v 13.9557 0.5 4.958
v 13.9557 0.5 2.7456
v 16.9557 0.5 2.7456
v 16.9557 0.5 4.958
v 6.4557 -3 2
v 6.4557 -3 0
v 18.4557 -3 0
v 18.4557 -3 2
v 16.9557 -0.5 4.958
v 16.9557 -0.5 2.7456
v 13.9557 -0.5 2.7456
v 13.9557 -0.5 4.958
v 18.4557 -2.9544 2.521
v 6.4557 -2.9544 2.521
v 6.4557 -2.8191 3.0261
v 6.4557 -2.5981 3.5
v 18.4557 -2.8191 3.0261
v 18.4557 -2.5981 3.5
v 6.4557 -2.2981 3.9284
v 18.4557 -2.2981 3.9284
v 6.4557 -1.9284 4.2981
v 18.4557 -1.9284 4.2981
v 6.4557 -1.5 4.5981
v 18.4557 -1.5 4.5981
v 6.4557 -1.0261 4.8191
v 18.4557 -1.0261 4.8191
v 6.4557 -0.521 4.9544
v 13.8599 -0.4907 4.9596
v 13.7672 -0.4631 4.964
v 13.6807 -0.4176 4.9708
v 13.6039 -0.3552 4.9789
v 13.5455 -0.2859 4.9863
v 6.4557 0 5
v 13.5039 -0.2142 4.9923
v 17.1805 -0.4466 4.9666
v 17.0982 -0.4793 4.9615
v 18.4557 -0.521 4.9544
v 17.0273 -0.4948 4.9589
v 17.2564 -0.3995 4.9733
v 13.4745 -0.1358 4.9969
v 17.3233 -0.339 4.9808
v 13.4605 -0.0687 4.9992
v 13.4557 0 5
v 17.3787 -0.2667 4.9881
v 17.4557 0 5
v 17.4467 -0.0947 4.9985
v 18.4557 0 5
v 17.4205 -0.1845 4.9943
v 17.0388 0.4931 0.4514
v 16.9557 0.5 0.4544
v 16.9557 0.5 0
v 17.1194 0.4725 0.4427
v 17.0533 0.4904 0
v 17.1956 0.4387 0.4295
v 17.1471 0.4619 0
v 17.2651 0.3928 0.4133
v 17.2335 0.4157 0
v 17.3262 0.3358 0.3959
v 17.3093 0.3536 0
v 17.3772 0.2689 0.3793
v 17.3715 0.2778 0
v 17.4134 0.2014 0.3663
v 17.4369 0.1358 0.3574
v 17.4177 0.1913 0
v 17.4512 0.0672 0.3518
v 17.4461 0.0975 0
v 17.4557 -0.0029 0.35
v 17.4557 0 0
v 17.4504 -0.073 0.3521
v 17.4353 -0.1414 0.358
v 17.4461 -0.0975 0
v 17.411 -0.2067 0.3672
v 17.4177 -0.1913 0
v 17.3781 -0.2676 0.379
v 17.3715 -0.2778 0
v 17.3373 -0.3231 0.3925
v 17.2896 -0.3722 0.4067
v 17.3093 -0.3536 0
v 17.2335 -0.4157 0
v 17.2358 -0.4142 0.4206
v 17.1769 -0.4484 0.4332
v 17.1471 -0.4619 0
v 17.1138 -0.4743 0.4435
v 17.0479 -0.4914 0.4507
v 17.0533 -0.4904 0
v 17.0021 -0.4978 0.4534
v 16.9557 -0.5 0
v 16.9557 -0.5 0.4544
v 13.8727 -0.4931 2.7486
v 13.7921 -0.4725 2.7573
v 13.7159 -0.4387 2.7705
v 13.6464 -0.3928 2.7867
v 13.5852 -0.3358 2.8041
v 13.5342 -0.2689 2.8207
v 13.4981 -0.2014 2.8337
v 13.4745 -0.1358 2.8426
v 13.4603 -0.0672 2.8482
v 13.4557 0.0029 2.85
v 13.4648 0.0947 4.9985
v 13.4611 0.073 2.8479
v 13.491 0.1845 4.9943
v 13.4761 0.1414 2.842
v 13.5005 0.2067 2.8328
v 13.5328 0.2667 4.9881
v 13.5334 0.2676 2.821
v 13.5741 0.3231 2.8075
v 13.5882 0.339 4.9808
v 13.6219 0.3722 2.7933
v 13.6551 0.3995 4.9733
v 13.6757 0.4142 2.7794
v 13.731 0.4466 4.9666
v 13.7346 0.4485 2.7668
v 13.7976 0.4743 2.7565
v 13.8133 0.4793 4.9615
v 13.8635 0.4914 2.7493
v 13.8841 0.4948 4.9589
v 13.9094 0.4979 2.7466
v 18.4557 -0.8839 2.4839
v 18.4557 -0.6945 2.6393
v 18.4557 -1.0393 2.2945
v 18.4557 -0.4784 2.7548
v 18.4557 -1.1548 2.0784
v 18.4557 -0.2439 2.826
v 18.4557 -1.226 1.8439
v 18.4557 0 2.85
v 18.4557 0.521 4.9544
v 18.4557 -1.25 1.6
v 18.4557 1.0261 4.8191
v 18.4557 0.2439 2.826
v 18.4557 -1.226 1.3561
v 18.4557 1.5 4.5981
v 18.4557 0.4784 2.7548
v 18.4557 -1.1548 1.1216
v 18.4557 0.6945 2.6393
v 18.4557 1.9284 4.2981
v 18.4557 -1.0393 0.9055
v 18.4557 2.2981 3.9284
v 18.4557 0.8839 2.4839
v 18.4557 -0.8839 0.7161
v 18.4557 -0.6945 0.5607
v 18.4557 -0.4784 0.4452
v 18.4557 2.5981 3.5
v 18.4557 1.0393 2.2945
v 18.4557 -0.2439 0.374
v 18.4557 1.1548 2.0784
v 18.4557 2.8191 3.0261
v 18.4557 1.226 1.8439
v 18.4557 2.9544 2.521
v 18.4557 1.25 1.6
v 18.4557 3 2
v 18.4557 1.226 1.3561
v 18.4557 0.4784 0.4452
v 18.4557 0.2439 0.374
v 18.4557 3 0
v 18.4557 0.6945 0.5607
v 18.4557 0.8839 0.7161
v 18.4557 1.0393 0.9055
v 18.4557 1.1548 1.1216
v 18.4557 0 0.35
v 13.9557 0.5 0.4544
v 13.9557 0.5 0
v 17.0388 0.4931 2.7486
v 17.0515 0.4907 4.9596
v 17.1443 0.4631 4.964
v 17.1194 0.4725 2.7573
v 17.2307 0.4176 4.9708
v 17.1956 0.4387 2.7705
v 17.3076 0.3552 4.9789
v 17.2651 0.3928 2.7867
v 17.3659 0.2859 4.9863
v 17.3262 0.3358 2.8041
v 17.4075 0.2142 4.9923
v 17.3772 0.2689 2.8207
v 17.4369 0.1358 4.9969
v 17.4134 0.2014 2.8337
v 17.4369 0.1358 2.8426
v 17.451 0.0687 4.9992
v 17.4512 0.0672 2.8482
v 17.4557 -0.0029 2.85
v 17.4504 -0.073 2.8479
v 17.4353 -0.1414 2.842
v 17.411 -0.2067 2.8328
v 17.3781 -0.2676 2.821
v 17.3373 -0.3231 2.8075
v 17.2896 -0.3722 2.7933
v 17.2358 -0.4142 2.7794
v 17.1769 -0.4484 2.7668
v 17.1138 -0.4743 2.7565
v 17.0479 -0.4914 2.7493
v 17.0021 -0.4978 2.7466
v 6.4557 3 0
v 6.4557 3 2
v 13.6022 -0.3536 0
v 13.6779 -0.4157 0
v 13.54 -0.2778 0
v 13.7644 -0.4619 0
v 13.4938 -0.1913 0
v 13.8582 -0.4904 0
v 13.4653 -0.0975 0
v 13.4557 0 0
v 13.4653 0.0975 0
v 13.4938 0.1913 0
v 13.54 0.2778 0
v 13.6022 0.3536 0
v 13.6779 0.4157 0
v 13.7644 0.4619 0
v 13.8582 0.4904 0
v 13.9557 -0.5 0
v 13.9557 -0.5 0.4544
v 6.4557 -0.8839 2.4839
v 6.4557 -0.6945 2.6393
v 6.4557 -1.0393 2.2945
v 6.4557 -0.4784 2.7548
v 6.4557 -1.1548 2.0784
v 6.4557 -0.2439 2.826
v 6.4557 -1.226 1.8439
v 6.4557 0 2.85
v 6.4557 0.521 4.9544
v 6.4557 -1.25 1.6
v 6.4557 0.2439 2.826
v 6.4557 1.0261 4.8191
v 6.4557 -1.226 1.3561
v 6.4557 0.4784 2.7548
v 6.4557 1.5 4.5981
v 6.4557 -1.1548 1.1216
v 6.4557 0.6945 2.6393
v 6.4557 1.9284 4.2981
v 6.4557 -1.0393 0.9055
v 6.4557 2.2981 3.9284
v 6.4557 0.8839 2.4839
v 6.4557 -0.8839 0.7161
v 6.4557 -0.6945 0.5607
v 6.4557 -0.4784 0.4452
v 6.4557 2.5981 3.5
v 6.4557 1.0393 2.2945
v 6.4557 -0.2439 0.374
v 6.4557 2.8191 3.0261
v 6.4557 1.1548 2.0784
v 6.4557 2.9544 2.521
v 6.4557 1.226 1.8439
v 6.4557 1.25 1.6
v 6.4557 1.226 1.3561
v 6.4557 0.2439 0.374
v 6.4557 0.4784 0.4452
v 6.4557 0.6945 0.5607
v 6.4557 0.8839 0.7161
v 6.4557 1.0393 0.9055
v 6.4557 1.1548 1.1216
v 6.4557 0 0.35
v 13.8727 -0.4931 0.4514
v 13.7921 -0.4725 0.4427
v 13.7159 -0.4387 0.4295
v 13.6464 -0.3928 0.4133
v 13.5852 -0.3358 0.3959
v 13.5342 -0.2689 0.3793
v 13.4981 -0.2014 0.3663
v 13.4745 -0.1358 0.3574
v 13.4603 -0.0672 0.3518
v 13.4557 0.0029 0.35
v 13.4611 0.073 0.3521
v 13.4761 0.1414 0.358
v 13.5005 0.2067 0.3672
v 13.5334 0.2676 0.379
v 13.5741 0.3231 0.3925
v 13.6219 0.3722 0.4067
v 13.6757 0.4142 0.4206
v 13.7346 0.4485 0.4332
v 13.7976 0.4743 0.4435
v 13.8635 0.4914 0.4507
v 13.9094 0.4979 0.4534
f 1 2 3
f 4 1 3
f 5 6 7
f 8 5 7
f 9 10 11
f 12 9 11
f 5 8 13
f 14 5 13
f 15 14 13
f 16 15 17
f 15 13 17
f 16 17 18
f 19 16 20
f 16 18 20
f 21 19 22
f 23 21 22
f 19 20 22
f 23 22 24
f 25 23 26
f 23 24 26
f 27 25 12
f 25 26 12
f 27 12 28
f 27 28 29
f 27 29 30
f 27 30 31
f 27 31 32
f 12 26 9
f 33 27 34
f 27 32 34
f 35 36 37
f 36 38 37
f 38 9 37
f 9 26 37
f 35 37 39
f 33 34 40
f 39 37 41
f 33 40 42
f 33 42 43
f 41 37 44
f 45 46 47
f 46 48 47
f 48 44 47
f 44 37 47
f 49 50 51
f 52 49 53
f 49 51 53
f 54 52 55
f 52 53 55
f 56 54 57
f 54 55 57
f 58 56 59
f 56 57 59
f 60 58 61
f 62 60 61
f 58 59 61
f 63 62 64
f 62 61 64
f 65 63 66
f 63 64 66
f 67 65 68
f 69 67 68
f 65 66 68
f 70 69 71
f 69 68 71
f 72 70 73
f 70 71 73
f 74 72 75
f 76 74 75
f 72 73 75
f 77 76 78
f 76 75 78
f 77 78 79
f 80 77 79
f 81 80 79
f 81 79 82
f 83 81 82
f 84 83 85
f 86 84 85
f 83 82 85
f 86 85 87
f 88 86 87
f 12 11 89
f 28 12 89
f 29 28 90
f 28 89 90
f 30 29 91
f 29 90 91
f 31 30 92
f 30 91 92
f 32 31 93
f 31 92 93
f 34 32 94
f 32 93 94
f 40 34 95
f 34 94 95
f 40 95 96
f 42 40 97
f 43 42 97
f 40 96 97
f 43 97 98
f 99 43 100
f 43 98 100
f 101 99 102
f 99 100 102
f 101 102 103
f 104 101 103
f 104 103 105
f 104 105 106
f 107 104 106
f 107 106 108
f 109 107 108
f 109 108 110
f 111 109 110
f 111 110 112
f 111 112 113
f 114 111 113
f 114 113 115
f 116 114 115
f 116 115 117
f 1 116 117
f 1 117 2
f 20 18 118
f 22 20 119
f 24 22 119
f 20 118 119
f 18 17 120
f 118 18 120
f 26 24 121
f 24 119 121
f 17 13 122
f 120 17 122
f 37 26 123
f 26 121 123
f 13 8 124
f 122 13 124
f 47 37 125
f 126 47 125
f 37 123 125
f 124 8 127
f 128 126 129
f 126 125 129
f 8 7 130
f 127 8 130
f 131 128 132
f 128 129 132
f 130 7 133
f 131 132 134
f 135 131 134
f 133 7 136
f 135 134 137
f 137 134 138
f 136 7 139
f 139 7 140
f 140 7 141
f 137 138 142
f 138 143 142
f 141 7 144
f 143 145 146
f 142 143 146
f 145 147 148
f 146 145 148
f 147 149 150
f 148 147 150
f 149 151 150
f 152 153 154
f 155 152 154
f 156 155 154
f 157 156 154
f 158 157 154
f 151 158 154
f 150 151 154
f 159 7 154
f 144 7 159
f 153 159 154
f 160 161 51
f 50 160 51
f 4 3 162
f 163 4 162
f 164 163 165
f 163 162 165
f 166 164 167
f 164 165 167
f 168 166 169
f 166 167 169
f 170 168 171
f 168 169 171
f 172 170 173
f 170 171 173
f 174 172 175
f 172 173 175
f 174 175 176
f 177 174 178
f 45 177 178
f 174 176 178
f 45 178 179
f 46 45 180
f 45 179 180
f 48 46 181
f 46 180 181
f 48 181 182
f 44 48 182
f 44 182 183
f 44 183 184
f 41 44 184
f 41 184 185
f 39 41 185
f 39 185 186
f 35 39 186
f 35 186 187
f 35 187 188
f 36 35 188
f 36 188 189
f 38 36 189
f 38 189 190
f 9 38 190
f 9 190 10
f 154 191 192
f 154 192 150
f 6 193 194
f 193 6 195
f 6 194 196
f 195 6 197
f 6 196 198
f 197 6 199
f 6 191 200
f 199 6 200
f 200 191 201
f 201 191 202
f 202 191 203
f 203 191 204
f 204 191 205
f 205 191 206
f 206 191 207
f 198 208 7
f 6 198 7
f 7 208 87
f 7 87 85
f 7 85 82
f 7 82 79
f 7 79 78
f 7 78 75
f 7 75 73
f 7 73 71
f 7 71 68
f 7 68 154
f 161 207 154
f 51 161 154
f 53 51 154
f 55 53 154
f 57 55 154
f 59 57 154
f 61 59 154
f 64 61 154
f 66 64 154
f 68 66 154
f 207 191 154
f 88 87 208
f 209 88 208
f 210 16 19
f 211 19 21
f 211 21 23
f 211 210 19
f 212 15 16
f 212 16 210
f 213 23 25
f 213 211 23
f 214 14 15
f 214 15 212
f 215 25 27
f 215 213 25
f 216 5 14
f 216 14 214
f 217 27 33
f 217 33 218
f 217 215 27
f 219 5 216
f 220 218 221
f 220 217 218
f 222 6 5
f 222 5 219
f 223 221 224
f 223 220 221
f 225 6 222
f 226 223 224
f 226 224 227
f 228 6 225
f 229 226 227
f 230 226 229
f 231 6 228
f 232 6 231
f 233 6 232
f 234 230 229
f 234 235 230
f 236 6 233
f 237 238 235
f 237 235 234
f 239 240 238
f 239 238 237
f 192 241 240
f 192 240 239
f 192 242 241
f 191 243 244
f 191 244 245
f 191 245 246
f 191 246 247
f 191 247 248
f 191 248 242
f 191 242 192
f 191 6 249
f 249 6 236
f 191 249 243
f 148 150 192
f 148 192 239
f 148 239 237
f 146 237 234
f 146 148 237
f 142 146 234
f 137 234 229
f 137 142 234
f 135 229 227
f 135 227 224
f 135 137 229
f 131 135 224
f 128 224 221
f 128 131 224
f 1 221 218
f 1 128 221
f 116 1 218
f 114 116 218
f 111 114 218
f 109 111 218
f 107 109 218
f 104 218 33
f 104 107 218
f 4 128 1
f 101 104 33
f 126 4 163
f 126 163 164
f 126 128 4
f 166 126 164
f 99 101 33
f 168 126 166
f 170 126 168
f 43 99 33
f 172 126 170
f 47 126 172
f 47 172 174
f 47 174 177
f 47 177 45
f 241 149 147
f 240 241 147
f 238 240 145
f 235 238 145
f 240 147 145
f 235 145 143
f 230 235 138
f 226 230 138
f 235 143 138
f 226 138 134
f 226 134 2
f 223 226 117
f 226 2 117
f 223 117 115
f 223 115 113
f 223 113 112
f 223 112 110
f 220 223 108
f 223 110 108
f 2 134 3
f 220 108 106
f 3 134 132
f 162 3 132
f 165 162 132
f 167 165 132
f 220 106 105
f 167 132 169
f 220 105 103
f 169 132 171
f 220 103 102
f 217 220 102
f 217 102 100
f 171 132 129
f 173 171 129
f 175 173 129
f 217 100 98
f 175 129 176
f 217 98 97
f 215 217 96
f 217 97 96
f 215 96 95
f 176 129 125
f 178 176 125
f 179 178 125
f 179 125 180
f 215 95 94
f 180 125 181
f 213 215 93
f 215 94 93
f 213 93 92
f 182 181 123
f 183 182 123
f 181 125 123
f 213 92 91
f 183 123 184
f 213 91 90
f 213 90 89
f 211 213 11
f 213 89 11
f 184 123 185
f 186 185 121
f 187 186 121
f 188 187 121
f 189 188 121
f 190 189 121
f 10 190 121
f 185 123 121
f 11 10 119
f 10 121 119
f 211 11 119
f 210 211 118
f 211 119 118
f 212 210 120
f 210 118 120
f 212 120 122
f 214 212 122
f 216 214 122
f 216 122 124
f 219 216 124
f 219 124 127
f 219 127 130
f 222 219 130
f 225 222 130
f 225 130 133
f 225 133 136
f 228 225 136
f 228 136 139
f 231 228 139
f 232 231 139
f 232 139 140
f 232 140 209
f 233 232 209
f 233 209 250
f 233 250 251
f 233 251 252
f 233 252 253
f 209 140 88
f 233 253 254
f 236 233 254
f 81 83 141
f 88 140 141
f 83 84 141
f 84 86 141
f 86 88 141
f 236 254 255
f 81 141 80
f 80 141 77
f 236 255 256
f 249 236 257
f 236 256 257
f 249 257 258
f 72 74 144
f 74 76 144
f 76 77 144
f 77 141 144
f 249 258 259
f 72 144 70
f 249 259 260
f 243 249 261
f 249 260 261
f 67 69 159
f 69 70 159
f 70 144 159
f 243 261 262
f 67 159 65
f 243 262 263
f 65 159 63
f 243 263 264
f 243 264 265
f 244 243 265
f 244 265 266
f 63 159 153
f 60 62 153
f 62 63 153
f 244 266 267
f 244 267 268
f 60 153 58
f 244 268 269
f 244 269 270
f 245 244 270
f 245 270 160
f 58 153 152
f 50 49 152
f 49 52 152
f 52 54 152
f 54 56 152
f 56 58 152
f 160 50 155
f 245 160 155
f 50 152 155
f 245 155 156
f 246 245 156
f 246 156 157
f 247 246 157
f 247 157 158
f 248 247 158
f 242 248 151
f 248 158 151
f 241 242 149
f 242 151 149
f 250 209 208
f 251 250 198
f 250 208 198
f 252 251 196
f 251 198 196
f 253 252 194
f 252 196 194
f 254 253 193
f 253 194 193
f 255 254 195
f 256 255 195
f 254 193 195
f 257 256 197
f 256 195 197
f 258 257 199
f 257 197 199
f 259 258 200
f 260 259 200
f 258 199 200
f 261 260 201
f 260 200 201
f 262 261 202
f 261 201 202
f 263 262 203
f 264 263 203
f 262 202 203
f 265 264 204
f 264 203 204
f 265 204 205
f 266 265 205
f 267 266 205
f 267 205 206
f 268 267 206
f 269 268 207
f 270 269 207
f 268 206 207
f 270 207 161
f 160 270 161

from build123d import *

# Parameters (mm, degrees)
F0_W     = 12
F0_H     = 6
F1_DEPTH = 5
F2_R     = 2.99999
F3_R     = 1.25
F4_DEPTH = 25
F6_DEPTH = 25


# Not quite as in the source:
# - a fillet or chamfer is up to 0.001 mm smaller than in the source, because OpenCascade refuses the exact size


with BuildPart() as f1:
    # F0 (on Top) → F1 (new body)
    with BuildSketch(Plane.XY):
        with Locations((12.4557307512, 0)):
            Rectangle(F0_W, F0_H)
    extrude(amount=F1_DEPTH)

    # F2 (radius 3 in the source; OpenCascade refuses exactly that, so slightly less here)
    f2_edges = [f1.edges().sort_by_distance(p)[0] for p in [
        (12.455731, -3, 5),
        (12.455731, 3, 5),
    ]]
    fillet(f2_edges, radius=F2_R)

    # F3 (on face) → F4 (cut)
    with BuildSketch(Plane.YZ.offset(18.4557307512)):
        with Locations((0, 1.6)):
            Circle(F3_R)
    extrude(amount=-F4_DEPTH, mode=Mode.SUBTRACT)

    # F5 (on face) → F6 (cut)
    with BuildSketch(Plane(origin=(0, 0, 0), x_dir=(1, 0, 0), z_dir=(0, 0, -1))):
        with BuildLine():
            Line((13.9557307512, -0.5), (16.9557307512, -0.5))
            ThreePointArc((16.9557307512, -0.5), (17.4557307512, 0), (16.9557307512, 0.5))
            Line((16.9557307512, 0.5), (13.9557307512, 0.5))
            ThreePointArc((13.9557307512, 0.5), (13.4557307512, 0), (13.9557307512, -0.5))
        make_face()
    extrude(amount=-F6_DEPTH, mode=Mode.SUBTRACT)


solid = f1.part
